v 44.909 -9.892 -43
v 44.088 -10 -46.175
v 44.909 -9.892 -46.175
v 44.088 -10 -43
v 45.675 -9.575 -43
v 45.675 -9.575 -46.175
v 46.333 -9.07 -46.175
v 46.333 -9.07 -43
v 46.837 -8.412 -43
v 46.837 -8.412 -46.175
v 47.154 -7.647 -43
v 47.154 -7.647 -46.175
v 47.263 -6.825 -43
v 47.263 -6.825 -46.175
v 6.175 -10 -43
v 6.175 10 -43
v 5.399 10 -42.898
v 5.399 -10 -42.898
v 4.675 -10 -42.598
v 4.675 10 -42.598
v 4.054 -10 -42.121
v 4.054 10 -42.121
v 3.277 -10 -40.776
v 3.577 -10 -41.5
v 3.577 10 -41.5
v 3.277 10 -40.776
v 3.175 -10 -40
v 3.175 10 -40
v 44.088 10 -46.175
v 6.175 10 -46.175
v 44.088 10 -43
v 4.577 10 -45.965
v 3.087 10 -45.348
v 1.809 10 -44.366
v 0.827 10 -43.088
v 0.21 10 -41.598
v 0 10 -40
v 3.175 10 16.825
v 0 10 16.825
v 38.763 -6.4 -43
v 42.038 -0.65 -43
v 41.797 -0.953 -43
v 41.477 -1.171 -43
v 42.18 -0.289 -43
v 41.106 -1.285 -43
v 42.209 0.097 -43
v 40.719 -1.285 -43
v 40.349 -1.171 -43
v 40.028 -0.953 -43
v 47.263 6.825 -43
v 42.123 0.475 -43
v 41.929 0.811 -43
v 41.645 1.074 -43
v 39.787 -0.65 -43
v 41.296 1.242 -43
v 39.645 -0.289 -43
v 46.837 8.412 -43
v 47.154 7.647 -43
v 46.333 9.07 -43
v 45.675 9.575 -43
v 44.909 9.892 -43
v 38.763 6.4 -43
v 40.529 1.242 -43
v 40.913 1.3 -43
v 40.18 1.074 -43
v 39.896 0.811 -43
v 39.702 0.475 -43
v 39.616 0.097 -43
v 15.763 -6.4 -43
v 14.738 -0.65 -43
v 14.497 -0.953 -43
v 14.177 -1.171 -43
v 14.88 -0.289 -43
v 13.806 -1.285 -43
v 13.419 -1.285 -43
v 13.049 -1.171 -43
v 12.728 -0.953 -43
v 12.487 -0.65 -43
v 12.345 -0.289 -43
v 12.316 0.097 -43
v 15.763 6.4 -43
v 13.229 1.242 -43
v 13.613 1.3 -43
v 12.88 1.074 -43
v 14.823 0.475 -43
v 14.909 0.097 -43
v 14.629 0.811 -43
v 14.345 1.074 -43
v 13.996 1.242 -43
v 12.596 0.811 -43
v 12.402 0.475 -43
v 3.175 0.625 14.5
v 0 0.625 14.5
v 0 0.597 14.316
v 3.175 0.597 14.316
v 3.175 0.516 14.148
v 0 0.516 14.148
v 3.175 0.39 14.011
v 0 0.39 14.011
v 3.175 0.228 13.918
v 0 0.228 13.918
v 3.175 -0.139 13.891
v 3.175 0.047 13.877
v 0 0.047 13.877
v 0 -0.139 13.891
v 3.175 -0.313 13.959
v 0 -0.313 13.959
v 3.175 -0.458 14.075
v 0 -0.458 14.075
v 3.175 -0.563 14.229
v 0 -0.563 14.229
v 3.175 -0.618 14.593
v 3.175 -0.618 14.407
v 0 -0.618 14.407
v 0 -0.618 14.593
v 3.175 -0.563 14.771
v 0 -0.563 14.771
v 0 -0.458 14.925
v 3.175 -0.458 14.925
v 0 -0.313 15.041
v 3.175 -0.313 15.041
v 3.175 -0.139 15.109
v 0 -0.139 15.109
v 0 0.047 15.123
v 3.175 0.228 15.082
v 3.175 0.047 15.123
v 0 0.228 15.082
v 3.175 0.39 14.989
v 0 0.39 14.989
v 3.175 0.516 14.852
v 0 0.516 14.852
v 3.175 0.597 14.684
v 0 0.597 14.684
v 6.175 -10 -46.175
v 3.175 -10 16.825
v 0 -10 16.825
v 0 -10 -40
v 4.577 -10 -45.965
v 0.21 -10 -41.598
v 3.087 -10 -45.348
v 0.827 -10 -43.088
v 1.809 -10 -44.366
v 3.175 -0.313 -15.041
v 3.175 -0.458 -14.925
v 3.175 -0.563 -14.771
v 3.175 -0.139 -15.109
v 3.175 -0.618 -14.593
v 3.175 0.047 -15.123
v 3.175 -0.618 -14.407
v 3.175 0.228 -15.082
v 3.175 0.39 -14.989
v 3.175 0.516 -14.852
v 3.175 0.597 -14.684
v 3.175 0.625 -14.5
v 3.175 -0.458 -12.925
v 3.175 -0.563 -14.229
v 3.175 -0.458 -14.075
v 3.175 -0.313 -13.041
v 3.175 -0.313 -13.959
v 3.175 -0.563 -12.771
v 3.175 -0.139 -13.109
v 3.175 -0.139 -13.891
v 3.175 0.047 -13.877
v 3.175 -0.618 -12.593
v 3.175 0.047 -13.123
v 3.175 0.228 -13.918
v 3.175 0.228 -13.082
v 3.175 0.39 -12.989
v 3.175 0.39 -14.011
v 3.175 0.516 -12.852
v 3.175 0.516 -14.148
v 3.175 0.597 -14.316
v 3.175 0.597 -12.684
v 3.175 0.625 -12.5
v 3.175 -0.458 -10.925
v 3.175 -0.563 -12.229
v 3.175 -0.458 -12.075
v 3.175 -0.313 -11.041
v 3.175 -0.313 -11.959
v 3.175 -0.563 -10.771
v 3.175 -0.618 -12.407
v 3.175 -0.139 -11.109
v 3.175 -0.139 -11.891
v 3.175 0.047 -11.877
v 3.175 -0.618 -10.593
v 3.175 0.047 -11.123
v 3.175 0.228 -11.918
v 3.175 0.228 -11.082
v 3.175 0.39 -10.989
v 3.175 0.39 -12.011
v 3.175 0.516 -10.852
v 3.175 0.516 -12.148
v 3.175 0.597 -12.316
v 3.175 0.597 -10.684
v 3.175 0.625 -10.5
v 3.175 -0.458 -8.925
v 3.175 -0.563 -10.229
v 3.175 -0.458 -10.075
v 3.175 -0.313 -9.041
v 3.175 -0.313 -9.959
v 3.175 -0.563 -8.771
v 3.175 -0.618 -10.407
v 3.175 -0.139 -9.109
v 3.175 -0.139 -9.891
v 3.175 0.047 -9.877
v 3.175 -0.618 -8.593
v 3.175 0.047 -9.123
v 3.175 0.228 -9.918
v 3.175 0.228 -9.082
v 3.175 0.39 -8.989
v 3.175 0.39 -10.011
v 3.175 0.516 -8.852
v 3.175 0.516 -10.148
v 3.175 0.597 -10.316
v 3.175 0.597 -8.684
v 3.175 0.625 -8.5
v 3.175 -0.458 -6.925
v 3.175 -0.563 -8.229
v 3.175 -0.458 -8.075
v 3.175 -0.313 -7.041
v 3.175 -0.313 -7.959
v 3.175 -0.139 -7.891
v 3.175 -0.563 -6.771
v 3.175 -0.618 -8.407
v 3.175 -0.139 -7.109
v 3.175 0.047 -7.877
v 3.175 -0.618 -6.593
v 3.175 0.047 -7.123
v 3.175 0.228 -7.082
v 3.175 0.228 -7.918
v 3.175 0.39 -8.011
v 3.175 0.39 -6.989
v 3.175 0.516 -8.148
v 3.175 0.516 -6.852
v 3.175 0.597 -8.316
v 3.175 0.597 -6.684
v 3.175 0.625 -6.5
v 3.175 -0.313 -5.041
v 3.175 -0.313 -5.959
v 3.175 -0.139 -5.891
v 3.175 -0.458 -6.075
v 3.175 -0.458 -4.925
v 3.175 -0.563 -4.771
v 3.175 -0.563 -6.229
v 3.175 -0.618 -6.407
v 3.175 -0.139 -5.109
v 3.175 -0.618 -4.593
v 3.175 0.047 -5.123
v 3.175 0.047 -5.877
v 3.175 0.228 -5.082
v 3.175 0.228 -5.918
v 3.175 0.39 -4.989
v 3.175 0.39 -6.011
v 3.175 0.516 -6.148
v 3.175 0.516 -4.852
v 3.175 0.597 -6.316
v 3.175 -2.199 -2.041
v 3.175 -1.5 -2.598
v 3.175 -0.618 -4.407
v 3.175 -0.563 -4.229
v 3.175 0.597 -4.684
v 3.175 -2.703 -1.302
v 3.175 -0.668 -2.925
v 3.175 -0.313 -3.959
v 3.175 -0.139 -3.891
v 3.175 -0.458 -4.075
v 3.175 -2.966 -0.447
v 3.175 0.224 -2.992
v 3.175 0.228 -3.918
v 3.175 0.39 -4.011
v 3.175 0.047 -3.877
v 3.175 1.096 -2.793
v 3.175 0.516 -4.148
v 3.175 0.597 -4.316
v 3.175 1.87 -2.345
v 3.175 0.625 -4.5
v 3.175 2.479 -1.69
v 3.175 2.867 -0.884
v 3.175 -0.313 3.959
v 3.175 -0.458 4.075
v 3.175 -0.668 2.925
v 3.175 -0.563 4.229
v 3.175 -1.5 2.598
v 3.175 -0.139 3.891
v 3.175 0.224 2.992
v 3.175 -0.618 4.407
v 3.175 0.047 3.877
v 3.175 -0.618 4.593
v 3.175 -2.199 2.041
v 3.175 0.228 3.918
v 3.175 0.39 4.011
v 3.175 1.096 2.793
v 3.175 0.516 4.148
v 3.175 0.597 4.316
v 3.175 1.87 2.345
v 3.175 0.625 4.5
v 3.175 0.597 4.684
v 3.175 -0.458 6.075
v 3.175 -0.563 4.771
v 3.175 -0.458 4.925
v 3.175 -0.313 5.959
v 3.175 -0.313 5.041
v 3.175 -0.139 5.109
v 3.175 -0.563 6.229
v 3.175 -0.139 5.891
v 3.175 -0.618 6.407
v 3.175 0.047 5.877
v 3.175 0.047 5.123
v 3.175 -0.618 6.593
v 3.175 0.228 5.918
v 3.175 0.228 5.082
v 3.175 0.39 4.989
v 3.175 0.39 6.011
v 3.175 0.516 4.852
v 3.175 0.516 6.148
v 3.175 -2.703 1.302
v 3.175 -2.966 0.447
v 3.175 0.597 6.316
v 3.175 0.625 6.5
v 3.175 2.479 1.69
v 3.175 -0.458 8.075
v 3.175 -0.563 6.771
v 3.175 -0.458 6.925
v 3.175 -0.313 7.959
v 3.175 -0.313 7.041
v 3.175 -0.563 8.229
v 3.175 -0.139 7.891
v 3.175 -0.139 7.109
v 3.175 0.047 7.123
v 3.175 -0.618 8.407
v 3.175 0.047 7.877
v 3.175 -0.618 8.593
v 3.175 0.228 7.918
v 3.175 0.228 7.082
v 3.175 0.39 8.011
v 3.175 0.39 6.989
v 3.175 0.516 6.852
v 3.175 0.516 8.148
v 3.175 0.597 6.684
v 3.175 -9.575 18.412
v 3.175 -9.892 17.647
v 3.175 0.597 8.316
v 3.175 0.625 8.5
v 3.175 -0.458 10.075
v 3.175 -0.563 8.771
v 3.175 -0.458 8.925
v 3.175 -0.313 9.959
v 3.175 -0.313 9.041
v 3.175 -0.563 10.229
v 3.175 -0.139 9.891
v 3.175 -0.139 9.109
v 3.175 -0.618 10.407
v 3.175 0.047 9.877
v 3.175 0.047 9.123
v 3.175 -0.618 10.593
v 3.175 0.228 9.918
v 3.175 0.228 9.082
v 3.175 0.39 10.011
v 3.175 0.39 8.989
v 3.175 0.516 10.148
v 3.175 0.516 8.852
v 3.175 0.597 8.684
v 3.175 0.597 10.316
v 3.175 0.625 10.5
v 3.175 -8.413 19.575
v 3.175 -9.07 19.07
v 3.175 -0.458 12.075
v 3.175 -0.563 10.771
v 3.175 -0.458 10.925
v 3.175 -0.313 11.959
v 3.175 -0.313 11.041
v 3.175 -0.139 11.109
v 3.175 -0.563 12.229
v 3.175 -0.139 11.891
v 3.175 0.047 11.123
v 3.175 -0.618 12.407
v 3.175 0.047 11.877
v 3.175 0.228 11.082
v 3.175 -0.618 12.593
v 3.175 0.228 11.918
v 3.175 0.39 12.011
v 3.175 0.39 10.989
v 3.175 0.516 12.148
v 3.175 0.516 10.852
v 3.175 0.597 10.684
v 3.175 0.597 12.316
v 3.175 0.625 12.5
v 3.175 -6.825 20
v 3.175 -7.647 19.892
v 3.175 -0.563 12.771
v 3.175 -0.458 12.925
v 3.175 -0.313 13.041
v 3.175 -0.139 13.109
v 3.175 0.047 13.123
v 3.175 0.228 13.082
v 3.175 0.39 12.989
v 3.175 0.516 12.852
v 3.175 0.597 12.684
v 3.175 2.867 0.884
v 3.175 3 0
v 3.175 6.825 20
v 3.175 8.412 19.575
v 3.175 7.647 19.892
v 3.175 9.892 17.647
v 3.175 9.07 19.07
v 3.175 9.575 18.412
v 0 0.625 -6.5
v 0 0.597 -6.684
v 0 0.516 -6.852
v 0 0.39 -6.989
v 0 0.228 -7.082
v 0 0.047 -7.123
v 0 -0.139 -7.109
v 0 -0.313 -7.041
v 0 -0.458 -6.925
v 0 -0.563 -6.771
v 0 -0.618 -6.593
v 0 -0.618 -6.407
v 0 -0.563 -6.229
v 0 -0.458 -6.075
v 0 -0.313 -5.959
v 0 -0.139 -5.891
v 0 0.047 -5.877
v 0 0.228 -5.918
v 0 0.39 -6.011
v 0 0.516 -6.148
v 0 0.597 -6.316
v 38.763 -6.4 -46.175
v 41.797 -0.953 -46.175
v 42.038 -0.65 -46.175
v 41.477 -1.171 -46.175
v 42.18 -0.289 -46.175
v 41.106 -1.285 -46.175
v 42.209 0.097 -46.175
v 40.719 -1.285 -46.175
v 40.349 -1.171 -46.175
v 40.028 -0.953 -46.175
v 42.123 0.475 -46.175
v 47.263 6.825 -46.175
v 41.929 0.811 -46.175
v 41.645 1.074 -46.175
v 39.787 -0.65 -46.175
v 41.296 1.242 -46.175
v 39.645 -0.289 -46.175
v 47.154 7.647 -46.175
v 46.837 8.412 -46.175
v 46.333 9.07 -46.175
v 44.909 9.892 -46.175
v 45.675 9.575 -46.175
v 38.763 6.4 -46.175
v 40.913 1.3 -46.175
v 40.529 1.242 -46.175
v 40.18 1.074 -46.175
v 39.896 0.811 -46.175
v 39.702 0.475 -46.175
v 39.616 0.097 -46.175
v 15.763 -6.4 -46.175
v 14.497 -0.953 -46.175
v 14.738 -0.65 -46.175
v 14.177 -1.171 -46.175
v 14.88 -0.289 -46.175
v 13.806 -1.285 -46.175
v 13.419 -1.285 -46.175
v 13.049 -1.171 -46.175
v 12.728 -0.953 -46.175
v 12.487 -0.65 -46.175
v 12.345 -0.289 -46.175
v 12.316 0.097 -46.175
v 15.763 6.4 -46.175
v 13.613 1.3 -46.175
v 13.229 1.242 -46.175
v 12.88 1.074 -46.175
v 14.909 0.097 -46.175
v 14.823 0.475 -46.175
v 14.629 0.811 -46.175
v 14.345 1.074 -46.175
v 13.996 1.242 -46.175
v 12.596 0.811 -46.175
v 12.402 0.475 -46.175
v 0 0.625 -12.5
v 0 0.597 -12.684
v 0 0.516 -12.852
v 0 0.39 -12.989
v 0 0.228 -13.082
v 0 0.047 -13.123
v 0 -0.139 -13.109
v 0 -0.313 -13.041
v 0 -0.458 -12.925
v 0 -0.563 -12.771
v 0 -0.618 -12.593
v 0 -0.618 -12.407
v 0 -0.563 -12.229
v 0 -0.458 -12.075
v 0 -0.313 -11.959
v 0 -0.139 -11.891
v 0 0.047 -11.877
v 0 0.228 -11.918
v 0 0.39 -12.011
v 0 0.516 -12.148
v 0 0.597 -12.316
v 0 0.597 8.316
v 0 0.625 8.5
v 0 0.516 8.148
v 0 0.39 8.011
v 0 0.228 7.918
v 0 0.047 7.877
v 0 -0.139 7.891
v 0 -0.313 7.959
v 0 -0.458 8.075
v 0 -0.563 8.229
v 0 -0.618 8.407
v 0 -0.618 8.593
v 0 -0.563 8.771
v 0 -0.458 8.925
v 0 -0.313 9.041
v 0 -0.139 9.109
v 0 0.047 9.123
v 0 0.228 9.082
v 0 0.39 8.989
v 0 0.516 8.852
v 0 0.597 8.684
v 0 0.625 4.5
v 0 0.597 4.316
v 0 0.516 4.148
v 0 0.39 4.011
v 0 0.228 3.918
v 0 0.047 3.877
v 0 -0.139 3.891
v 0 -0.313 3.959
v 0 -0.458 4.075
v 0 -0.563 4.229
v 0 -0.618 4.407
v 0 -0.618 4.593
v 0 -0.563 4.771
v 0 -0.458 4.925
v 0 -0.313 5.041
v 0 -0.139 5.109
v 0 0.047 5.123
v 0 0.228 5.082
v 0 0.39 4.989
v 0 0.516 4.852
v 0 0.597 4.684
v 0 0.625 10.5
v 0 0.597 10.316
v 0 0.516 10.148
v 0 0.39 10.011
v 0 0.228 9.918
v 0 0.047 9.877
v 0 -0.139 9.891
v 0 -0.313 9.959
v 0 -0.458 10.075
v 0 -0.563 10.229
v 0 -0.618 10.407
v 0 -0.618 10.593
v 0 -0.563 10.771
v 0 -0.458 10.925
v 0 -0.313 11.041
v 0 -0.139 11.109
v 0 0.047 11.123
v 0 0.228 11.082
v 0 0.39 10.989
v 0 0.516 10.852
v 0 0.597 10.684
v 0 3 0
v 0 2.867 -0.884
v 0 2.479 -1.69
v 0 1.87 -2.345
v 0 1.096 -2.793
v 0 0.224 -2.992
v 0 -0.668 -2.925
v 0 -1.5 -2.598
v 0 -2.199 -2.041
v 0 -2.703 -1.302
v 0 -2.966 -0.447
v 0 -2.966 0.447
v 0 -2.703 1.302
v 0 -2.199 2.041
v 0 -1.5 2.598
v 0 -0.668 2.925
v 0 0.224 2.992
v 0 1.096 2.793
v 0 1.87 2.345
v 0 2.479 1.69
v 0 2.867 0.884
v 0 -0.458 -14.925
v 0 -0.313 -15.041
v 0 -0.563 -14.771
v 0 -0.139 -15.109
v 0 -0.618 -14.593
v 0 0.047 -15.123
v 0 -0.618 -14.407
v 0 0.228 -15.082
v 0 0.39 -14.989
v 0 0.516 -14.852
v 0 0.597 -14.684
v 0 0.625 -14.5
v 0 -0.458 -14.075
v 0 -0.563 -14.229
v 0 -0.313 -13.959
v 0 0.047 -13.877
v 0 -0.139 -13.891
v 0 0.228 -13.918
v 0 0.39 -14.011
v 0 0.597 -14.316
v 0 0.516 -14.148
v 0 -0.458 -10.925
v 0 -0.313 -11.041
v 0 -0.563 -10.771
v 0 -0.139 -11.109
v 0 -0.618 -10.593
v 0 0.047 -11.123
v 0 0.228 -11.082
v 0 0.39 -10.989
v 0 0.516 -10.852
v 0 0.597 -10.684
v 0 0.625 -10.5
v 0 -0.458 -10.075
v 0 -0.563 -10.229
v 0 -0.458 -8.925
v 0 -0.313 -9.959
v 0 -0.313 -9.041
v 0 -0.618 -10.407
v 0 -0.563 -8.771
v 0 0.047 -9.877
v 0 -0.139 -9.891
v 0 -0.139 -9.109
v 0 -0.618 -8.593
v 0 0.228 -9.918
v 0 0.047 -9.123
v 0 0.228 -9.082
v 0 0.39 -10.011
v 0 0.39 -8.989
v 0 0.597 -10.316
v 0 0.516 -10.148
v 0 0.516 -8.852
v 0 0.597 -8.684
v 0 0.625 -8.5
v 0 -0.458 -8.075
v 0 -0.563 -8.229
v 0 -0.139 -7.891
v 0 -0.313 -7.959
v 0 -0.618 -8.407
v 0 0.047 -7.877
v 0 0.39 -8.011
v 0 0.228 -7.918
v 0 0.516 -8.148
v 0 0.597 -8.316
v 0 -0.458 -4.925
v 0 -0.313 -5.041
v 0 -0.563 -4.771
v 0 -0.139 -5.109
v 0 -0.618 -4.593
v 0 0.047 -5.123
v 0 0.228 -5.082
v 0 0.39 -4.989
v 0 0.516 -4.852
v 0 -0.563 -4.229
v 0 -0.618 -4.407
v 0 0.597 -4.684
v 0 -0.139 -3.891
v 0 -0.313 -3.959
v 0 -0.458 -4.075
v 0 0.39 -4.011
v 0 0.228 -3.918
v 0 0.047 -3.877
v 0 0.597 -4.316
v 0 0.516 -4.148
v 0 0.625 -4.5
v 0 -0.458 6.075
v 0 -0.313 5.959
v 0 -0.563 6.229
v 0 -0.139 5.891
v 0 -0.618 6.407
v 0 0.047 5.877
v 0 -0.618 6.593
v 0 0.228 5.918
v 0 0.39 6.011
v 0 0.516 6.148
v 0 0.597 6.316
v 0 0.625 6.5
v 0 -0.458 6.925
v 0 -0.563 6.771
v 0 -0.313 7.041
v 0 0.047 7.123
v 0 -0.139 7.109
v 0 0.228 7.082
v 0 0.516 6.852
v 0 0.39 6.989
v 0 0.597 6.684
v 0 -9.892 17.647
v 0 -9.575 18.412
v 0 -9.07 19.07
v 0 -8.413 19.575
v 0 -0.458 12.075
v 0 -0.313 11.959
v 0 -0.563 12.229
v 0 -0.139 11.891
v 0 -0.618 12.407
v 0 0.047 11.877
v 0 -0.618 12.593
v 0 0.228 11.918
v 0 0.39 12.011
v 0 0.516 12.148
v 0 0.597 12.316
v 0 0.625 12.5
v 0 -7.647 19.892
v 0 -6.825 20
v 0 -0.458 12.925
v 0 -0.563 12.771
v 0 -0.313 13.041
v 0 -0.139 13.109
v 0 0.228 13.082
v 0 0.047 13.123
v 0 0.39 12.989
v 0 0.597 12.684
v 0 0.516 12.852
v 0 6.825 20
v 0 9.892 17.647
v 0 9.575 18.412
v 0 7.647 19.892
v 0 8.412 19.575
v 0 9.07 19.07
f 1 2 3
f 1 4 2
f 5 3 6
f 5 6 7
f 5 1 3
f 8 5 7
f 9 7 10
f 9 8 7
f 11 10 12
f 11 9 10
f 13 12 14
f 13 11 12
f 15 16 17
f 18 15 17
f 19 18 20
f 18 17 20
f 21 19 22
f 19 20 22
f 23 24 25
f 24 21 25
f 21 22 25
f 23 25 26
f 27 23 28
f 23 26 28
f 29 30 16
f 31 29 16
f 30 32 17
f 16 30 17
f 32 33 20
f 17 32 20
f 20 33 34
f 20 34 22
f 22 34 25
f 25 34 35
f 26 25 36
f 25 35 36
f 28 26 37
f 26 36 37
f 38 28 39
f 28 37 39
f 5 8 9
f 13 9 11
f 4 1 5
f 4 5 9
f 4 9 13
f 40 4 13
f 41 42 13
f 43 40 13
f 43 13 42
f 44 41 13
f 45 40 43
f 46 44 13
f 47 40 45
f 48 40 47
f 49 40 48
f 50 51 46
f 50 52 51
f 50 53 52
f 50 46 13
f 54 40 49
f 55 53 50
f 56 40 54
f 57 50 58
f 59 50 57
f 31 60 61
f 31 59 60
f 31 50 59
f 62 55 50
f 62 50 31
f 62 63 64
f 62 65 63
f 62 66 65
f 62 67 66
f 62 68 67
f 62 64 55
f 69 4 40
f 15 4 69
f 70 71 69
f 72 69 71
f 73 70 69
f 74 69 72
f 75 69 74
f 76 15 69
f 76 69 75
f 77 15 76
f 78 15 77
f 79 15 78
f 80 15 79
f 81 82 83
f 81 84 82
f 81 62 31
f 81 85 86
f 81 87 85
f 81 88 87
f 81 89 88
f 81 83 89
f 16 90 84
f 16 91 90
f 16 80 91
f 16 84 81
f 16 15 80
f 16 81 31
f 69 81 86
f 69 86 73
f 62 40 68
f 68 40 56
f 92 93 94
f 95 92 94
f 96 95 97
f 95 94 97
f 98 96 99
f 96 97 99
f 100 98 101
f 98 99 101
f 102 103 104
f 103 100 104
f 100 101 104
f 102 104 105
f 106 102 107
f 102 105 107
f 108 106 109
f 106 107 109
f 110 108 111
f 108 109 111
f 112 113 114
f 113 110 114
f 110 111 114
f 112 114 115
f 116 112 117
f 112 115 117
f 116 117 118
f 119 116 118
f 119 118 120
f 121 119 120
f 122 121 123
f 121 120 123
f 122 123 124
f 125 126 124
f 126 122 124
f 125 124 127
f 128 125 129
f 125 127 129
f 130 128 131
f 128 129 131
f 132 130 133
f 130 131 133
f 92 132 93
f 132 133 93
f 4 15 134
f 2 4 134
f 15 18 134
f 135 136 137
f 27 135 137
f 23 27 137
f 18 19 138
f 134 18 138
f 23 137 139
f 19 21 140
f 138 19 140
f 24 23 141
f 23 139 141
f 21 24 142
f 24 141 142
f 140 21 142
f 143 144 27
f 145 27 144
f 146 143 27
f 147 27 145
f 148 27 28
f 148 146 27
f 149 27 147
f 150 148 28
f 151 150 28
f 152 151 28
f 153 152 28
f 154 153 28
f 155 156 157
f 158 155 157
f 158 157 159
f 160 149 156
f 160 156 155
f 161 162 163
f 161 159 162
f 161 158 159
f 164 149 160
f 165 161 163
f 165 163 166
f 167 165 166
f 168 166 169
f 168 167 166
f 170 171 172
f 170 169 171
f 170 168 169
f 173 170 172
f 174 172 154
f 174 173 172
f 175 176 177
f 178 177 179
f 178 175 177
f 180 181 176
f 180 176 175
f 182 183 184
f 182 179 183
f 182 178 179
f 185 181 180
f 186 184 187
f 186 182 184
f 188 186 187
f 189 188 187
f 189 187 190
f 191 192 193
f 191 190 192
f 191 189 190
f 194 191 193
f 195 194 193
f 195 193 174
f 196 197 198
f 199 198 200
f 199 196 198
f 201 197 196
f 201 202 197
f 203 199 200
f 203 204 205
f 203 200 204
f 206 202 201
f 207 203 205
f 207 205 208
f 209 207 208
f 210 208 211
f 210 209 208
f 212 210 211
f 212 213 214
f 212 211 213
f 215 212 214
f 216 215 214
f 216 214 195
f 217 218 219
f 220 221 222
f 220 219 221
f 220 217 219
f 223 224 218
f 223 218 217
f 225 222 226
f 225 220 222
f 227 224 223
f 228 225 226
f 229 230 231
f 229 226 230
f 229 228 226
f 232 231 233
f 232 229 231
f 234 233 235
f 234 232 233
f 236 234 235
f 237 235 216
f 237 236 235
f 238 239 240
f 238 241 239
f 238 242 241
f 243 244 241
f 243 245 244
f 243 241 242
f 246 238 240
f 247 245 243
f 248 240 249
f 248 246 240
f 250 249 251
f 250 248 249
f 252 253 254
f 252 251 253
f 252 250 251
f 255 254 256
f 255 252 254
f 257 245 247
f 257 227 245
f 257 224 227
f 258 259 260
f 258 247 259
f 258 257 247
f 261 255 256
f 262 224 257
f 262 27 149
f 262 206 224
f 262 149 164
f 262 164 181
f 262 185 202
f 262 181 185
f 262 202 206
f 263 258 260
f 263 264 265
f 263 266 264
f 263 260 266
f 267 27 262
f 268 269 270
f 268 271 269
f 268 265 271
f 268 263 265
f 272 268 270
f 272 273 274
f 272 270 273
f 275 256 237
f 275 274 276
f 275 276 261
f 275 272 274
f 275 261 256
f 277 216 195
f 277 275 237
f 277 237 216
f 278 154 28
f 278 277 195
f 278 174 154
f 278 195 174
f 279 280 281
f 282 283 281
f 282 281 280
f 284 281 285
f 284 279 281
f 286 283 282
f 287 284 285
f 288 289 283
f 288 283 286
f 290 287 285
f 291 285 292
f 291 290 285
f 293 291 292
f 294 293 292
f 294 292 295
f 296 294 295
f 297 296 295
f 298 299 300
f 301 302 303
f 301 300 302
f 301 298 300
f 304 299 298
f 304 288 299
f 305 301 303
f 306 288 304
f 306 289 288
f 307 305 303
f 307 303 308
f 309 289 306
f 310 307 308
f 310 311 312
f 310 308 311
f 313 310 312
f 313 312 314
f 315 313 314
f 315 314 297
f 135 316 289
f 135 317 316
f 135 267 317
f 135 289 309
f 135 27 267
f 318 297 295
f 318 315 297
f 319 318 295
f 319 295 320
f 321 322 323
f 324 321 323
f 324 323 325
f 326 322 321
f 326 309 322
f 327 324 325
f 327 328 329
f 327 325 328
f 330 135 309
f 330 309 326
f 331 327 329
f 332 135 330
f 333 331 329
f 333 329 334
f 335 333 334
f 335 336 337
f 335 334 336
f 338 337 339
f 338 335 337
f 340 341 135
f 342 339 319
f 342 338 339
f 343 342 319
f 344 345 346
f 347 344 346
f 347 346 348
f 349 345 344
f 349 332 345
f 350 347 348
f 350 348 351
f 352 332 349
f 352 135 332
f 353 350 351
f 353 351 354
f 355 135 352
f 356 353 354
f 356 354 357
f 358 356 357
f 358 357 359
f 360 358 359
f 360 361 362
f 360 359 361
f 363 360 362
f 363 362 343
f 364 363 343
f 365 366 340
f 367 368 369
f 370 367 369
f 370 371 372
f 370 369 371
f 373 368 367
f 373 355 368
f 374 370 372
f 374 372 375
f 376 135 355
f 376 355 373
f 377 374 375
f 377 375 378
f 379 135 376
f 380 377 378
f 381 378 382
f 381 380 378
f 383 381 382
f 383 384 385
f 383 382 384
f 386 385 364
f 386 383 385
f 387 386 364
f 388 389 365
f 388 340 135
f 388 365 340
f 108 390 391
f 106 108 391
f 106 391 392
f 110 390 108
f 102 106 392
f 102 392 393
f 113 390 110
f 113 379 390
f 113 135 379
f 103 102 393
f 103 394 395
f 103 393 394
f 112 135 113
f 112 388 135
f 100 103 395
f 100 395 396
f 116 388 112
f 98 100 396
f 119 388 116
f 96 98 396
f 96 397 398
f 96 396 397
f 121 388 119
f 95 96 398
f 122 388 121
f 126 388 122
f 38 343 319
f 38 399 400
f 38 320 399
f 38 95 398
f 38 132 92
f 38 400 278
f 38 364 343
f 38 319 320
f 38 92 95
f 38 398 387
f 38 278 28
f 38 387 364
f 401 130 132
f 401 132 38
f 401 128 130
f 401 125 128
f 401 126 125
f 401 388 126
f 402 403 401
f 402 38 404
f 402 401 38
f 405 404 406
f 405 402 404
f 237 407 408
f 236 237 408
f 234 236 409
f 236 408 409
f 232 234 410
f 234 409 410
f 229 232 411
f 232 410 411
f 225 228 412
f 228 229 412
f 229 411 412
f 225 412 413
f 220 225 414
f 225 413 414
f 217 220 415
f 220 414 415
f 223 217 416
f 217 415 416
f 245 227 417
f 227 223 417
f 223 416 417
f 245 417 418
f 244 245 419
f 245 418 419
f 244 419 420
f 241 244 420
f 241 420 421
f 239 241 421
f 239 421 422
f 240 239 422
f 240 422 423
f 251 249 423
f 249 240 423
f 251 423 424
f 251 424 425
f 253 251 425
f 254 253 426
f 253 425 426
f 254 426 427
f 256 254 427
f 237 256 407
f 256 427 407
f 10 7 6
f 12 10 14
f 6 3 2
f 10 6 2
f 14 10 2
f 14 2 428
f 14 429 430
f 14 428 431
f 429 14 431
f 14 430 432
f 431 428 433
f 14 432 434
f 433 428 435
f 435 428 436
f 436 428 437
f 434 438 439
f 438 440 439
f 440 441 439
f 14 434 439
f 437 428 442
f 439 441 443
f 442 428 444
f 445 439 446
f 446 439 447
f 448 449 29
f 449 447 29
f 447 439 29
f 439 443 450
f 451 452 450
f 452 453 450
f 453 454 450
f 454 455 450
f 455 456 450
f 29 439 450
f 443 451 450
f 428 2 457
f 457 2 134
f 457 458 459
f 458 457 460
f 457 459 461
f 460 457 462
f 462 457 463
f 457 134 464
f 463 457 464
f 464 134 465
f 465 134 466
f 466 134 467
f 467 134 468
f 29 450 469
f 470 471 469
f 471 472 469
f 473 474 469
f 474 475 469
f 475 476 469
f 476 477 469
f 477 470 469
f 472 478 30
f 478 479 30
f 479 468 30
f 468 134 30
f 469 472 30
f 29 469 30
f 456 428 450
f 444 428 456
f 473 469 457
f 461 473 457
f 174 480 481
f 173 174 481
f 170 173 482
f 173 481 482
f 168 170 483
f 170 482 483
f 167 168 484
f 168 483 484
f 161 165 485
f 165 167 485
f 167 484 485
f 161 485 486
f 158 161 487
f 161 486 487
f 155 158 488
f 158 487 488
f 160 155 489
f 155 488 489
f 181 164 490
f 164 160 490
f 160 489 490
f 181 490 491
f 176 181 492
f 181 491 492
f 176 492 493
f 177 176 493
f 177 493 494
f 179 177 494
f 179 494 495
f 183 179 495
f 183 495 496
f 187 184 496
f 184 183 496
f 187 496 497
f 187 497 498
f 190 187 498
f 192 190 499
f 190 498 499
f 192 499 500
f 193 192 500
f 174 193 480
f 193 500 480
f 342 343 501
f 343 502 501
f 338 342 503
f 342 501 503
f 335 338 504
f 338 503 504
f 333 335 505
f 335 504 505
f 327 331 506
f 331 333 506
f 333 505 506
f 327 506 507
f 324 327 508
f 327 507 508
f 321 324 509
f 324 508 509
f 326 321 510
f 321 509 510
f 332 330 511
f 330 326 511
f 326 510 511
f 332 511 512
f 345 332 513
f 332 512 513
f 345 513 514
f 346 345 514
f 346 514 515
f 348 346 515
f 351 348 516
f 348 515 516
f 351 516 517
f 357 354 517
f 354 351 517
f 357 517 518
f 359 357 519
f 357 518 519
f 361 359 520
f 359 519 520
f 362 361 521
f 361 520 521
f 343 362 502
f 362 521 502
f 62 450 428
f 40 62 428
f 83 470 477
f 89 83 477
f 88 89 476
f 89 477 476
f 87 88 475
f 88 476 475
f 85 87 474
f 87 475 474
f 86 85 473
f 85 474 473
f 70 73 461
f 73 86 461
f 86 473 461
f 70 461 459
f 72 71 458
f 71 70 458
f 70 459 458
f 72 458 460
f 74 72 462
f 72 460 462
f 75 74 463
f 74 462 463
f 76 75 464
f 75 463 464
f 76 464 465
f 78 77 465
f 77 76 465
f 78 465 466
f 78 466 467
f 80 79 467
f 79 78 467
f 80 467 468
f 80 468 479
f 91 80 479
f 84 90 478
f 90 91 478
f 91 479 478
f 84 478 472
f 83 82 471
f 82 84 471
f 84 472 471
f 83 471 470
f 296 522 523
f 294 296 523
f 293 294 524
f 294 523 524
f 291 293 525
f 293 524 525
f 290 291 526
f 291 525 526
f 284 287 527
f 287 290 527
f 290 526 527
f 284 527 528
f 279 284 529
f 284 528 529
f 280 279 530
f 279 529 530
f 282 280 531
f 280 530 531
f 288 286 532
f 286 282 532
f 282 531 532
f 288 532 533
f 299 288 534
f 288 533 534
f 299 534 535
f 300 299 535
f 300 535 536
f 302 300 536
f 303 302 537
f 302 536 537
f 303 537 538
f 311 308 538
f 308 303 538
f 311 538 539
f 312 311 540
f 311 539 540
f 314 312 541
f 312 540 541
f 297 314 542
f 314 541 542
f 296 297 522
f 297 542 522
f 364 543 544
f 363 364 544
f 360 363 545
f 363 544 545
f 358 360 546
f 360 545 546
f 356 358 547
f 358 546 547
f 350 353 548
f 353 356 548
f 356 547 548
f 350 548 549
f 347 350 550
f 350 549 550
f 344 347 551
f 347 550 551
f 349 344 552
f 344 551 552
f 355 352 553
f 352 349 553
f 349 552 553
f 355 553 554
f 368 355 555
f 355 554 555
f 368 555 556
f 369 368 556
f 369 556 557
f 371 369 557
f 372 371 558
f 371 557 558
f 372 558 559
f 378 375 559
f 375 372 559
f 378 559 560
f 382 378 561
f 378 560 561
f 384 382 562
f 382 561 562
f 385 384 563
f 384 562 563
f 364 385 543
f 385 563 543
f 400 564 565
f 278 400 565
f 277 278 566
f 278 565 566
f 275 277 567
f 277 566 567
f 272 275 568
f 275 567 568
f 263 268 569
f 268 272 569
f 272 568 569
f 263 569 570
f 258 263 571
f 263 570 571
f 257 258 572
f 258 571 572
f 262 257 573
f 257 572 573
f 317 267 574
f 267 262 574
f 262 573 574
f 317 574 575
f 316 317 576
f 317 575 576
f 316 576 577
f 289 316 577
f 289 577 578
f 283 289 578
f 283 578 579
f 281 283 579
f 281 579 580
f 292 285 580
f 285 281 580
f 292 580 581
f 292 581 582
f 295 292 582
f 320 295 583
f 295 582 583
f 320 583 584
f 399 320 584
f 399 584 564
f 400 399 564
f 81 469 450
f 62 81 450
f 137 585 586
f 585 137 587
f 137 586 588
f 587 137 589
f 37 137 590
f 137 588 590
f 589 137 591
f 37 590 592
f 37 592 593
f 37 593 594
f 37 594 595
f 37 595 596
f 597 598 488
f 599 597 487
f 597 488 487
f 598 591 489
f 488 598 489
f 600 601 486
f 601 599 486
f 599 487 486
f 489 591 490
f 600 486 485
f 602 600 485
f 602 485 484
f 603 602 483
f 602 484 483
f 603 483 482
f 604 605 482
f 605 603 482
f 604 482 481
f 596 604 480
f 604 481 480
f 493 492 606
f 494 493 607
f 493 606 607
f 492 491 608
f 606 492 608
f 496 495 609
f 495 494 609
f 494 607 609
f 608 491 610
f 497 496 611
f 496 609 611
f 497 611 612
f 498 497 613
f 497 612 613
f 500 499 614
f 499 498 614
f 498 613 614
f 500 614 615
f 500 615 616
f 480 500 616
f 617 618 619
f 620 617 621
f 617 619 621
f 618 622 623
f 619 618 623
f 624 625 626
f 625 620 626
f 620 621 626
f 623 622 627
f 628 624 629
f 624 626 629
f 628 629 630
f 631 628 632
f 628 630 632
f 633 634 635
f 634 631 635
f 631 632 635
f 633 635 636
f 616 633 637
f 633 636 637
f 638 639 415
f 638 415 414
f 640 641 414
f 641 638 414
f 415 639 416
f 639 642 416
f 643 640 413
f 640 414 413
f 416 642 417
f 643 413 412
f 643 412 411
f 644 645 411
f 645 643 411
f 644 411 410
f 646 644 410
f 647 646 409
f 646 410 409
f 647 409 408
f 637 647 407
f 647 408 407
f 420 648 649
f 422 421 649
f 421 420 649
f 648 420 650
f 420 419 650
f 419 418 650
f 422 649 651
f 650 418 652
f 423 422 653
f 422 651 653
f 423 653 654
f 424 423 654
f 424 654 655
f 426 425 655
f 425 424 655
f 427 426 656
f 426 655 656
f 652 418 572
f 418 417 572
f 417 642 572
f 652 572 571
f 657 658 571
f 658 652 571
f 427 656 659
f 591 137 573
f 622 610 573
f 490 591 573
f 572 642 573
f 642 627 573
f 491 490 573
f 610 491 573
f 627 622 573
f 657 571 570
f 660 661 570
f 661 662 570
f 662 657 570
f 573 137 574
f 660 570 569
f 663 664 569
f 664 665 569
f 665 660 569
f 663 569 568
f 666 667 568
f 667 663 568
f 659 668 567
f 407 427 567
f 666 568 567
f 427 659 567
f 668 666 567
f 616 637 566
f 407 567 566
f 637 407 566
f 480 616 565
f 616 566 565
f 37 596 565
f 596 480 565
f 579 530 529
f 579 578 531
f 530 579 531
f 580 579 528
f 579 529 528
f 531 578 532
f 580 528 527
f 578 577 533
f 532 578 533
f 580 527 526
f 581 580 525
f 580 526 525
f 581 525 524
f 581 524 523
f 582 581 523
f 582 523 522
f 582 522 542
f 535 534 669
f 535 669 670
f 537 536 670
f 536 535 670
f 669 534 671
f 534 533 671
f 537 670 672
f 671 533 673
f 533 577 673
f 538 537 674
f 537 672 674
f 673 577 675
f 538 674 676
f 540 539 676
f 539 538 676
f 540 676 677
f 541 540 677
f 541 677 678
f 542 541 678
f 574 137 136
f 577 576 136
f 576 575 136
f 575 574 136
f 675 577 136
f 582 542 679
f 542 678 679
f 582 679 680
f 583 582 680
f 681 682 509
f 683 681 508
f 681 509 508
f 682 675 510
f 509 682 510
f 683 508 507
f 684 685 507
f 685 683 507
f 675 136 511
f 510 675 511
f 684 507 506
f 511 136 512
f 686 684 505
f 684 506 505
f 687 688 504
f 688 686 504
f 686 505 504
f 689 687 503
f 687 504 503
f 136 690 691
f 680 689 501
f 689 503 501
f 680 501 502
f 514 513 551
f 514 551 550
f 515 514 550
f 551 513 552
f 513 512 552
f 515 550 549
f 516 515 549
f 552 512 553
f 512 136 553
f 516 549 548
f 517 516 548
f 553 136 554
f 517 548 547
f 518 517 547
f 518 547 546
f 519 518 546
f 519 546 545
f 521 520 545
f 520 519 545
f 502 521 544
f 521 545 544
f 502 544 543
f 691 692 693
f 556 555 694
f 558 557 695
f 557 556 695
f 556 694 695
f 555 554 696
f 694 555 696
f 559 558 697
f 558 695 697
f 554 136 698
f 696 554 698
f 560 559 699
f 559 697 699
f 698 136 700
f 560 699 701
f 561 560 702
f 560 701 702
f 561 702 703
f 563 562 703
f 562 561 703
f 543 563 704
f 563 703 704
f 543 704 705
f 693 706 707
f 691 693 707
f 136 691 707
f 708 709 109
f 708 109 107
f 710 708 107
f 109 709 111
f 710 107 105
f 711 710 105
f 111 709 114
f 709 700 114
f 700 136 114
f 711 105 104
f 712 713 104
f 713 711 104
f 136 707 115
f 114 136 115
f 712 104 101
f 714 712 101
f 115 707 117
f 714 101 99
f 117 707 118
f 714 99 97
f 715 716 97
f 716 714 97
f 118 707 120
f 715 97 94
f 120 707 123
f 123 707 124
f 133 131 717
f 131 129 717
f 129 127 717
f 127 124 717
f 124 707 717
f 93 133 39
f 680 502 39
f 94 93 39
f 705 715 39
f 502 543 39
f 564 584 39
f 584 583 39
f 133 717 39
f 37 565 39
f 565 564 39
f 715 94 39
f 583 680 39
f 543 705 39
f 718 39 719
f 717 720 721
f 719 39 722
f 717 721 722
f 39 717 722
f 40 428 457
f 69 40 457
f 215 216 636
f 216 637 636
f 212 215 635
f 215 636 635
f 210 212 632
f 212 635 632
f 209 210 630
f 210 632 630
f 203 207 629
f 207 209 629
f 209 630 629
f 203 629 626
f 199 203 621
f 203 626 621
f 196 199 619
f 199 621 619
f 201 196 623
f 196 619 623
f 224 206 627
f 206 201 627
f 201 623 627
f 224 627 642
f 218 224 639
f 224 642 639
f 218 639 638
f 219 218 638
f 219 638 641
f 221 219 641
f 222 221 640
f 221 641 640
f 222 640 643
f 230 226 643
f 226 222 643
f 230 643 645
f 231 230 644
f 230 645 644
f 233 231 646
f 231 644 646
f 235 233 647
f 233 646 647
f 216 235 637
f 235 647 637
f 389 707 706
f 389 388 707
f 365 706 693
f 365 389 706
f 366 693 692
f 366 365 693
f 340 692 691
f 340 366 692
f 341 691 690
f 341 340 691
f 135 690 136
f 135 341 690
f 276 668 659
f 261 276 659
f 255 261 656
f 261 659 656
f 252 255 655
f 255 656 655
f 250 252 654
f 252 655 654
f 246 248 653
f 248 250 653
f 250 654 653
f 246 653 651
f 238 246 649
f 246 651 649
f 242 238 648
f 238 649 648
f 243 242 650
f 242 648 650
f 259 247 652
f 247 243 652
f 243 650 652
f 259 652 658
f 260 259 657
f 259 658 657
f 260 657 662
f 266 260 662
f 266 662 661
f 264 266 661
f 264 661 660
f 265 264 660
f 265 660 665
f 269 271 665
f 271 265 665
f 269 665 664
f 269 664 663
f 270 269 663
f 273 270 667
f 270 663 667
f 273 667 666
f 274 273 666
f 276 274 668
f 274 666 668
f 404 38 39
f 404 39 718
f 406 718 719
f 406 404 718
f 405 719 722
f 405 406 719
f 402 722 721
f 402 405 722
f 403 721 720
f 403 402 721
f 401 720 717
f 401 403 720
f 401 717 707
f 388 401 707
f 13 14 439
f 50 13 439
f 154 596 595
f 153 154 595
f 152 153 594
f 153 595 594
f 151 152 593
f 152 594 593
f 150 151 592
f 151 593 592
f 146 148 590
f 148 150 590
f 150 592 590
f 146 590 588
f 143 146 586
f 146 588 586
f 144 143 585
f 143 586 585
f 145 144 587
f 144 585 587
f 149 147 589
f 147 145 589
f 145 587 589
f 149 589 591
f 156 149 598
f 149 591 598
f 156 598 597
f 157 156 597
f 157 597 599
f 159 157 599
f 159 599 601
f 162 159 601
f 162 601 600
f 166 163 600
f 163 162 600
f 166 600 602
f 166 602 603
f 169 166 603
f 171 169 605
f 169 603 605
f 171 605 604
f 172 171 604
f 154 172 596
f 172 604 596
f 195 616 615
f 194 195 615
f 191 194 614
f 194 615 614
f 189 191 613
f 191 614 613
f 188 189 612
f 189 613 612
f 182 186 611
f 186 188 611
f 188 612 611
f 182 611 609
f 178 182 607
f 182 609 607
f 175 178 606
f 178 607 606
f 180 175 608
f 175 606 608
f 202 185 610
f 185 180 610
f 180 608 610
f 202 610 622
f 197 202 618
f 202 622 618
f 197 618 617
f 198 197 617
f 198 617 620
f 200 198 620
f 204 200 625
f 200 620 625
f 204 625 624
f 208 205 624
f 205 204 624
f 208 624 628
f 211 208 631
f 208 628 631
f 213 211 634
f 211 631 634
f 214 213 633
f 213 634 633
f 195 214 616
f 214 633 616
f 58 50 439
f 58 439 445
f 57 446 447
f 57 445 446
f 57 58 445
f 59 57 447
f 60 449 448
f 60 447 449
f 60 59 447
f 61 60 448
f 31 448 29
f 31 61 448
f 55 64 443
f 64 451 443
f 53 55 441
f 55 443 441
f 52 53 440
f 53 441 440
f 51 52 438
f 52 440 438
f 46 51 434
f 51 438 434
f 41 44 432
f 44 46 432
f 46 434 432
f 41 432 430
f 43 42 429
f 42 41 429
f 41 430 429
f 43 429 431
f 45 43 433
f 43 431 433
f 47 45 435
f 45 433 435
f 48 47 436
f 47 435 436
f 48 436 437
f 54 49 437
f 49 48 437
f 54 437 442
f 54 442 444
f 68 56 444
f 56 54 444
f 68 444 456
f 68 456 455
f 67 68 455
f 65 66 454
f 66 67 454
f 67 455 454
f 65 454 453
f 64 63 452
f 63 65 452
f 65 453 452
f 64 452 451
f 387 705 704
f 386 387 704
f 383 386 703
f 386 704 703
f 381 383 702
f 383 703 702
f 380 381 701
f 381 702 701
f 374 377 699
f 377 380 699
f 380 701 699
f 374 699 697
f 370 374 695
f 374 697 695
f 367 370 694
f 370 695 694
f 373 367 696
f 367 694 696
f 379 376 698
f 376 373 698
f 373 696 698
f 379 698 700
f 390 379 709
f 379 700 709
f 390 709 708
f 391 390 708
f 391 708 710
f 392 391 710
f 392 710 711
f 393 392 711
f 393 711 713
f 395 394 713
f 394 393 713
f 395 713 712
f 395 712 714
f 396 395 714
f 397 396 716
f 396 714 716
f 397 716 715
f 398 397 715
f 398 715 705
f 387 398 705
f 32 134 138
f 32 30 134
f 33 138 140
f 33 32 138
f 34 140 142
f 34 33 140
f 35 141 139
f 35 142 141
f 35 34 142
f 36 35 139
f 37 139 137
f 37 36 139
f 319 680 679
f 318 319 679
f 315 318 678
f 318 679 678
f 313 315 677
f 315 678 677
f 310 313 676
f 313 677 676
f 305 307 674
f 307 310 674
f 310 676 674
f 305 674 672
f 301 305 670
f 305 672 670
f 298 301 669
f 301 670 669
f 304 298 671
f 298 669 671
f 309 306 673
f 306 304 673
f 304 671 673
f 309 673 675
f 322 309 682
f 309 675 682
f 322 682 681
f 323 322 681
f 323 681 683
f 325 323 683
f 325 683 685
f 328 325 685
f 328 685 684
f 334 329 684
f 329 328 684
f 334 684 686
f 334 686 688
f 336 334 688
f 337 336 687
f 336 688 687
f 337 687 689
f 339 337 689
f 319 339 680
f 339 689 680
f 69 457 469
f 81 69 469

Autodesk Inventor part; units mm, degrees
ref_plane "YZ Plane" through (0, 0, 0) normal (1, 0, 0) x (0, 1, 0)
ref_plane "XZ Plane" through (0, 0, 0) normal (0, 1, 0) x (-1, 0, 0)
ref_plane "XY Plane" through (0, 0, 0) normal (0, 0, 1) x (1, 0, 0)
sketch "Sketch1" plane through (0, 0, 0) normal (1, 0, 0) x (0, 1, 0)
  circle A0 centre (0, 0) radius 2.5 construction
  circle A1 centre (0, 0) radius 3
  line L0 (0, 0) -> (0, -32.9) construction
  line L1 (-10, -85.8) -> (10, -85.8)
  line L2 (10, -85.8) -> (10, 20)
  line L3 (10, 20) -> (-10, 20)
  line L4 (-10, 20) -> (-10, -85.8)
  line L5 (-10, -85.8) -> (10, 20) construction
  line L6 (10, -85.8) -> (-10, 20) construction
  circle A2 centre (0, 0) radius 4.5 construction
  circle A3 centre (0, -4.5) radius 0.625
  circle A4 centre (0, -6.5) radius 0.625
  circle A5 centre (0, -8.5) radius 0.625
  circle A6 centre (0, -10.5) radius 0.625
  circle A7 centre (0, -12.5) radius 0.625
  circle A8 centre (0, -14.5) radius 0.625
  circle A9 centre (0, 14.5) radius 0.625
  circle A10 centre (0, 12.5) radius 0.625
  circle A11 centre (0, 10.5) radius 0.625
  circle A12 centre (0, 8.5) radius 0.625
  circle A13 centre (0, 6.5) radius 0.625
  circle A14 centre (0, 4.5) radius 0.625
  line L7 (-6.4, -54.3) -> (6.4, -54.3)
  line L8 (6.4, -54.3) -> (6.4, -77.3)
  line L9 (6.4, -77.3) -> (-6.4, -77.3)
  line L10 (-6.4, -77.3) -> (-6.4, -54.3)
  line L11 (-6.4, -54.3) -> (6.4, -77.3) construction
  line L12 (6.4, -54.3) -> (-6.4, -77.3) construction
  circle A15 centre (0, -65.8) radius 13.65 construction
  circle A16 centre (0, -79.45) radius 1.3
  circle A17 centre (0, -52.15) radius 1.3
  dimension "d5" = 9
  dimension "d19" = 27.3
  dimension "d0" = 5
  dimension "d1" = 6
  dimension "d2" = 20
  dimension "d3" = 105.8
  dimension "d4" = 20
  dimension "d6" = 1.25
  dimension "d9" = 2
  dimension "d16" = 360
  dimension "d18" = 23
  dimension "d20" = 2.6
  dimension "d21" = 12.8
  dimension "d24" = 360
  dimension "d26" = 20
extrude "Extrusion1" add sketch "Sketch1" along normal blind 3.175
fillet "Fillet1" radius 3.175 4 edges at (1.5875, 10, 20) (1.5875, -10, 20) (1.5875, 10, -85.8) (1.5875, -10, -85.8)
sketch "Sketch2" plane through (3.175, 0, 0) normal (1, 0, 0) x (0, 0, -1)
  line L0 (82.625, 10) -> (-16.825, 10) projected
  line L1 (40, 10) -> (40, -10)
  line L2 (-16.825, -10) -> (82.625, -10) projected
  line L3 (-20, 6.825) -> (-20, -6.825) projected
  point P0 (0, 0)
  dimension "d30" = 60
bend part "Bend Part1" radius 3 angle 90 line through (3.175, 10, -40) along (0, -1, 0) centre toward (1, 0, 0) moving side (0, 0, -1) both sides no
properties part number "Topplate"
